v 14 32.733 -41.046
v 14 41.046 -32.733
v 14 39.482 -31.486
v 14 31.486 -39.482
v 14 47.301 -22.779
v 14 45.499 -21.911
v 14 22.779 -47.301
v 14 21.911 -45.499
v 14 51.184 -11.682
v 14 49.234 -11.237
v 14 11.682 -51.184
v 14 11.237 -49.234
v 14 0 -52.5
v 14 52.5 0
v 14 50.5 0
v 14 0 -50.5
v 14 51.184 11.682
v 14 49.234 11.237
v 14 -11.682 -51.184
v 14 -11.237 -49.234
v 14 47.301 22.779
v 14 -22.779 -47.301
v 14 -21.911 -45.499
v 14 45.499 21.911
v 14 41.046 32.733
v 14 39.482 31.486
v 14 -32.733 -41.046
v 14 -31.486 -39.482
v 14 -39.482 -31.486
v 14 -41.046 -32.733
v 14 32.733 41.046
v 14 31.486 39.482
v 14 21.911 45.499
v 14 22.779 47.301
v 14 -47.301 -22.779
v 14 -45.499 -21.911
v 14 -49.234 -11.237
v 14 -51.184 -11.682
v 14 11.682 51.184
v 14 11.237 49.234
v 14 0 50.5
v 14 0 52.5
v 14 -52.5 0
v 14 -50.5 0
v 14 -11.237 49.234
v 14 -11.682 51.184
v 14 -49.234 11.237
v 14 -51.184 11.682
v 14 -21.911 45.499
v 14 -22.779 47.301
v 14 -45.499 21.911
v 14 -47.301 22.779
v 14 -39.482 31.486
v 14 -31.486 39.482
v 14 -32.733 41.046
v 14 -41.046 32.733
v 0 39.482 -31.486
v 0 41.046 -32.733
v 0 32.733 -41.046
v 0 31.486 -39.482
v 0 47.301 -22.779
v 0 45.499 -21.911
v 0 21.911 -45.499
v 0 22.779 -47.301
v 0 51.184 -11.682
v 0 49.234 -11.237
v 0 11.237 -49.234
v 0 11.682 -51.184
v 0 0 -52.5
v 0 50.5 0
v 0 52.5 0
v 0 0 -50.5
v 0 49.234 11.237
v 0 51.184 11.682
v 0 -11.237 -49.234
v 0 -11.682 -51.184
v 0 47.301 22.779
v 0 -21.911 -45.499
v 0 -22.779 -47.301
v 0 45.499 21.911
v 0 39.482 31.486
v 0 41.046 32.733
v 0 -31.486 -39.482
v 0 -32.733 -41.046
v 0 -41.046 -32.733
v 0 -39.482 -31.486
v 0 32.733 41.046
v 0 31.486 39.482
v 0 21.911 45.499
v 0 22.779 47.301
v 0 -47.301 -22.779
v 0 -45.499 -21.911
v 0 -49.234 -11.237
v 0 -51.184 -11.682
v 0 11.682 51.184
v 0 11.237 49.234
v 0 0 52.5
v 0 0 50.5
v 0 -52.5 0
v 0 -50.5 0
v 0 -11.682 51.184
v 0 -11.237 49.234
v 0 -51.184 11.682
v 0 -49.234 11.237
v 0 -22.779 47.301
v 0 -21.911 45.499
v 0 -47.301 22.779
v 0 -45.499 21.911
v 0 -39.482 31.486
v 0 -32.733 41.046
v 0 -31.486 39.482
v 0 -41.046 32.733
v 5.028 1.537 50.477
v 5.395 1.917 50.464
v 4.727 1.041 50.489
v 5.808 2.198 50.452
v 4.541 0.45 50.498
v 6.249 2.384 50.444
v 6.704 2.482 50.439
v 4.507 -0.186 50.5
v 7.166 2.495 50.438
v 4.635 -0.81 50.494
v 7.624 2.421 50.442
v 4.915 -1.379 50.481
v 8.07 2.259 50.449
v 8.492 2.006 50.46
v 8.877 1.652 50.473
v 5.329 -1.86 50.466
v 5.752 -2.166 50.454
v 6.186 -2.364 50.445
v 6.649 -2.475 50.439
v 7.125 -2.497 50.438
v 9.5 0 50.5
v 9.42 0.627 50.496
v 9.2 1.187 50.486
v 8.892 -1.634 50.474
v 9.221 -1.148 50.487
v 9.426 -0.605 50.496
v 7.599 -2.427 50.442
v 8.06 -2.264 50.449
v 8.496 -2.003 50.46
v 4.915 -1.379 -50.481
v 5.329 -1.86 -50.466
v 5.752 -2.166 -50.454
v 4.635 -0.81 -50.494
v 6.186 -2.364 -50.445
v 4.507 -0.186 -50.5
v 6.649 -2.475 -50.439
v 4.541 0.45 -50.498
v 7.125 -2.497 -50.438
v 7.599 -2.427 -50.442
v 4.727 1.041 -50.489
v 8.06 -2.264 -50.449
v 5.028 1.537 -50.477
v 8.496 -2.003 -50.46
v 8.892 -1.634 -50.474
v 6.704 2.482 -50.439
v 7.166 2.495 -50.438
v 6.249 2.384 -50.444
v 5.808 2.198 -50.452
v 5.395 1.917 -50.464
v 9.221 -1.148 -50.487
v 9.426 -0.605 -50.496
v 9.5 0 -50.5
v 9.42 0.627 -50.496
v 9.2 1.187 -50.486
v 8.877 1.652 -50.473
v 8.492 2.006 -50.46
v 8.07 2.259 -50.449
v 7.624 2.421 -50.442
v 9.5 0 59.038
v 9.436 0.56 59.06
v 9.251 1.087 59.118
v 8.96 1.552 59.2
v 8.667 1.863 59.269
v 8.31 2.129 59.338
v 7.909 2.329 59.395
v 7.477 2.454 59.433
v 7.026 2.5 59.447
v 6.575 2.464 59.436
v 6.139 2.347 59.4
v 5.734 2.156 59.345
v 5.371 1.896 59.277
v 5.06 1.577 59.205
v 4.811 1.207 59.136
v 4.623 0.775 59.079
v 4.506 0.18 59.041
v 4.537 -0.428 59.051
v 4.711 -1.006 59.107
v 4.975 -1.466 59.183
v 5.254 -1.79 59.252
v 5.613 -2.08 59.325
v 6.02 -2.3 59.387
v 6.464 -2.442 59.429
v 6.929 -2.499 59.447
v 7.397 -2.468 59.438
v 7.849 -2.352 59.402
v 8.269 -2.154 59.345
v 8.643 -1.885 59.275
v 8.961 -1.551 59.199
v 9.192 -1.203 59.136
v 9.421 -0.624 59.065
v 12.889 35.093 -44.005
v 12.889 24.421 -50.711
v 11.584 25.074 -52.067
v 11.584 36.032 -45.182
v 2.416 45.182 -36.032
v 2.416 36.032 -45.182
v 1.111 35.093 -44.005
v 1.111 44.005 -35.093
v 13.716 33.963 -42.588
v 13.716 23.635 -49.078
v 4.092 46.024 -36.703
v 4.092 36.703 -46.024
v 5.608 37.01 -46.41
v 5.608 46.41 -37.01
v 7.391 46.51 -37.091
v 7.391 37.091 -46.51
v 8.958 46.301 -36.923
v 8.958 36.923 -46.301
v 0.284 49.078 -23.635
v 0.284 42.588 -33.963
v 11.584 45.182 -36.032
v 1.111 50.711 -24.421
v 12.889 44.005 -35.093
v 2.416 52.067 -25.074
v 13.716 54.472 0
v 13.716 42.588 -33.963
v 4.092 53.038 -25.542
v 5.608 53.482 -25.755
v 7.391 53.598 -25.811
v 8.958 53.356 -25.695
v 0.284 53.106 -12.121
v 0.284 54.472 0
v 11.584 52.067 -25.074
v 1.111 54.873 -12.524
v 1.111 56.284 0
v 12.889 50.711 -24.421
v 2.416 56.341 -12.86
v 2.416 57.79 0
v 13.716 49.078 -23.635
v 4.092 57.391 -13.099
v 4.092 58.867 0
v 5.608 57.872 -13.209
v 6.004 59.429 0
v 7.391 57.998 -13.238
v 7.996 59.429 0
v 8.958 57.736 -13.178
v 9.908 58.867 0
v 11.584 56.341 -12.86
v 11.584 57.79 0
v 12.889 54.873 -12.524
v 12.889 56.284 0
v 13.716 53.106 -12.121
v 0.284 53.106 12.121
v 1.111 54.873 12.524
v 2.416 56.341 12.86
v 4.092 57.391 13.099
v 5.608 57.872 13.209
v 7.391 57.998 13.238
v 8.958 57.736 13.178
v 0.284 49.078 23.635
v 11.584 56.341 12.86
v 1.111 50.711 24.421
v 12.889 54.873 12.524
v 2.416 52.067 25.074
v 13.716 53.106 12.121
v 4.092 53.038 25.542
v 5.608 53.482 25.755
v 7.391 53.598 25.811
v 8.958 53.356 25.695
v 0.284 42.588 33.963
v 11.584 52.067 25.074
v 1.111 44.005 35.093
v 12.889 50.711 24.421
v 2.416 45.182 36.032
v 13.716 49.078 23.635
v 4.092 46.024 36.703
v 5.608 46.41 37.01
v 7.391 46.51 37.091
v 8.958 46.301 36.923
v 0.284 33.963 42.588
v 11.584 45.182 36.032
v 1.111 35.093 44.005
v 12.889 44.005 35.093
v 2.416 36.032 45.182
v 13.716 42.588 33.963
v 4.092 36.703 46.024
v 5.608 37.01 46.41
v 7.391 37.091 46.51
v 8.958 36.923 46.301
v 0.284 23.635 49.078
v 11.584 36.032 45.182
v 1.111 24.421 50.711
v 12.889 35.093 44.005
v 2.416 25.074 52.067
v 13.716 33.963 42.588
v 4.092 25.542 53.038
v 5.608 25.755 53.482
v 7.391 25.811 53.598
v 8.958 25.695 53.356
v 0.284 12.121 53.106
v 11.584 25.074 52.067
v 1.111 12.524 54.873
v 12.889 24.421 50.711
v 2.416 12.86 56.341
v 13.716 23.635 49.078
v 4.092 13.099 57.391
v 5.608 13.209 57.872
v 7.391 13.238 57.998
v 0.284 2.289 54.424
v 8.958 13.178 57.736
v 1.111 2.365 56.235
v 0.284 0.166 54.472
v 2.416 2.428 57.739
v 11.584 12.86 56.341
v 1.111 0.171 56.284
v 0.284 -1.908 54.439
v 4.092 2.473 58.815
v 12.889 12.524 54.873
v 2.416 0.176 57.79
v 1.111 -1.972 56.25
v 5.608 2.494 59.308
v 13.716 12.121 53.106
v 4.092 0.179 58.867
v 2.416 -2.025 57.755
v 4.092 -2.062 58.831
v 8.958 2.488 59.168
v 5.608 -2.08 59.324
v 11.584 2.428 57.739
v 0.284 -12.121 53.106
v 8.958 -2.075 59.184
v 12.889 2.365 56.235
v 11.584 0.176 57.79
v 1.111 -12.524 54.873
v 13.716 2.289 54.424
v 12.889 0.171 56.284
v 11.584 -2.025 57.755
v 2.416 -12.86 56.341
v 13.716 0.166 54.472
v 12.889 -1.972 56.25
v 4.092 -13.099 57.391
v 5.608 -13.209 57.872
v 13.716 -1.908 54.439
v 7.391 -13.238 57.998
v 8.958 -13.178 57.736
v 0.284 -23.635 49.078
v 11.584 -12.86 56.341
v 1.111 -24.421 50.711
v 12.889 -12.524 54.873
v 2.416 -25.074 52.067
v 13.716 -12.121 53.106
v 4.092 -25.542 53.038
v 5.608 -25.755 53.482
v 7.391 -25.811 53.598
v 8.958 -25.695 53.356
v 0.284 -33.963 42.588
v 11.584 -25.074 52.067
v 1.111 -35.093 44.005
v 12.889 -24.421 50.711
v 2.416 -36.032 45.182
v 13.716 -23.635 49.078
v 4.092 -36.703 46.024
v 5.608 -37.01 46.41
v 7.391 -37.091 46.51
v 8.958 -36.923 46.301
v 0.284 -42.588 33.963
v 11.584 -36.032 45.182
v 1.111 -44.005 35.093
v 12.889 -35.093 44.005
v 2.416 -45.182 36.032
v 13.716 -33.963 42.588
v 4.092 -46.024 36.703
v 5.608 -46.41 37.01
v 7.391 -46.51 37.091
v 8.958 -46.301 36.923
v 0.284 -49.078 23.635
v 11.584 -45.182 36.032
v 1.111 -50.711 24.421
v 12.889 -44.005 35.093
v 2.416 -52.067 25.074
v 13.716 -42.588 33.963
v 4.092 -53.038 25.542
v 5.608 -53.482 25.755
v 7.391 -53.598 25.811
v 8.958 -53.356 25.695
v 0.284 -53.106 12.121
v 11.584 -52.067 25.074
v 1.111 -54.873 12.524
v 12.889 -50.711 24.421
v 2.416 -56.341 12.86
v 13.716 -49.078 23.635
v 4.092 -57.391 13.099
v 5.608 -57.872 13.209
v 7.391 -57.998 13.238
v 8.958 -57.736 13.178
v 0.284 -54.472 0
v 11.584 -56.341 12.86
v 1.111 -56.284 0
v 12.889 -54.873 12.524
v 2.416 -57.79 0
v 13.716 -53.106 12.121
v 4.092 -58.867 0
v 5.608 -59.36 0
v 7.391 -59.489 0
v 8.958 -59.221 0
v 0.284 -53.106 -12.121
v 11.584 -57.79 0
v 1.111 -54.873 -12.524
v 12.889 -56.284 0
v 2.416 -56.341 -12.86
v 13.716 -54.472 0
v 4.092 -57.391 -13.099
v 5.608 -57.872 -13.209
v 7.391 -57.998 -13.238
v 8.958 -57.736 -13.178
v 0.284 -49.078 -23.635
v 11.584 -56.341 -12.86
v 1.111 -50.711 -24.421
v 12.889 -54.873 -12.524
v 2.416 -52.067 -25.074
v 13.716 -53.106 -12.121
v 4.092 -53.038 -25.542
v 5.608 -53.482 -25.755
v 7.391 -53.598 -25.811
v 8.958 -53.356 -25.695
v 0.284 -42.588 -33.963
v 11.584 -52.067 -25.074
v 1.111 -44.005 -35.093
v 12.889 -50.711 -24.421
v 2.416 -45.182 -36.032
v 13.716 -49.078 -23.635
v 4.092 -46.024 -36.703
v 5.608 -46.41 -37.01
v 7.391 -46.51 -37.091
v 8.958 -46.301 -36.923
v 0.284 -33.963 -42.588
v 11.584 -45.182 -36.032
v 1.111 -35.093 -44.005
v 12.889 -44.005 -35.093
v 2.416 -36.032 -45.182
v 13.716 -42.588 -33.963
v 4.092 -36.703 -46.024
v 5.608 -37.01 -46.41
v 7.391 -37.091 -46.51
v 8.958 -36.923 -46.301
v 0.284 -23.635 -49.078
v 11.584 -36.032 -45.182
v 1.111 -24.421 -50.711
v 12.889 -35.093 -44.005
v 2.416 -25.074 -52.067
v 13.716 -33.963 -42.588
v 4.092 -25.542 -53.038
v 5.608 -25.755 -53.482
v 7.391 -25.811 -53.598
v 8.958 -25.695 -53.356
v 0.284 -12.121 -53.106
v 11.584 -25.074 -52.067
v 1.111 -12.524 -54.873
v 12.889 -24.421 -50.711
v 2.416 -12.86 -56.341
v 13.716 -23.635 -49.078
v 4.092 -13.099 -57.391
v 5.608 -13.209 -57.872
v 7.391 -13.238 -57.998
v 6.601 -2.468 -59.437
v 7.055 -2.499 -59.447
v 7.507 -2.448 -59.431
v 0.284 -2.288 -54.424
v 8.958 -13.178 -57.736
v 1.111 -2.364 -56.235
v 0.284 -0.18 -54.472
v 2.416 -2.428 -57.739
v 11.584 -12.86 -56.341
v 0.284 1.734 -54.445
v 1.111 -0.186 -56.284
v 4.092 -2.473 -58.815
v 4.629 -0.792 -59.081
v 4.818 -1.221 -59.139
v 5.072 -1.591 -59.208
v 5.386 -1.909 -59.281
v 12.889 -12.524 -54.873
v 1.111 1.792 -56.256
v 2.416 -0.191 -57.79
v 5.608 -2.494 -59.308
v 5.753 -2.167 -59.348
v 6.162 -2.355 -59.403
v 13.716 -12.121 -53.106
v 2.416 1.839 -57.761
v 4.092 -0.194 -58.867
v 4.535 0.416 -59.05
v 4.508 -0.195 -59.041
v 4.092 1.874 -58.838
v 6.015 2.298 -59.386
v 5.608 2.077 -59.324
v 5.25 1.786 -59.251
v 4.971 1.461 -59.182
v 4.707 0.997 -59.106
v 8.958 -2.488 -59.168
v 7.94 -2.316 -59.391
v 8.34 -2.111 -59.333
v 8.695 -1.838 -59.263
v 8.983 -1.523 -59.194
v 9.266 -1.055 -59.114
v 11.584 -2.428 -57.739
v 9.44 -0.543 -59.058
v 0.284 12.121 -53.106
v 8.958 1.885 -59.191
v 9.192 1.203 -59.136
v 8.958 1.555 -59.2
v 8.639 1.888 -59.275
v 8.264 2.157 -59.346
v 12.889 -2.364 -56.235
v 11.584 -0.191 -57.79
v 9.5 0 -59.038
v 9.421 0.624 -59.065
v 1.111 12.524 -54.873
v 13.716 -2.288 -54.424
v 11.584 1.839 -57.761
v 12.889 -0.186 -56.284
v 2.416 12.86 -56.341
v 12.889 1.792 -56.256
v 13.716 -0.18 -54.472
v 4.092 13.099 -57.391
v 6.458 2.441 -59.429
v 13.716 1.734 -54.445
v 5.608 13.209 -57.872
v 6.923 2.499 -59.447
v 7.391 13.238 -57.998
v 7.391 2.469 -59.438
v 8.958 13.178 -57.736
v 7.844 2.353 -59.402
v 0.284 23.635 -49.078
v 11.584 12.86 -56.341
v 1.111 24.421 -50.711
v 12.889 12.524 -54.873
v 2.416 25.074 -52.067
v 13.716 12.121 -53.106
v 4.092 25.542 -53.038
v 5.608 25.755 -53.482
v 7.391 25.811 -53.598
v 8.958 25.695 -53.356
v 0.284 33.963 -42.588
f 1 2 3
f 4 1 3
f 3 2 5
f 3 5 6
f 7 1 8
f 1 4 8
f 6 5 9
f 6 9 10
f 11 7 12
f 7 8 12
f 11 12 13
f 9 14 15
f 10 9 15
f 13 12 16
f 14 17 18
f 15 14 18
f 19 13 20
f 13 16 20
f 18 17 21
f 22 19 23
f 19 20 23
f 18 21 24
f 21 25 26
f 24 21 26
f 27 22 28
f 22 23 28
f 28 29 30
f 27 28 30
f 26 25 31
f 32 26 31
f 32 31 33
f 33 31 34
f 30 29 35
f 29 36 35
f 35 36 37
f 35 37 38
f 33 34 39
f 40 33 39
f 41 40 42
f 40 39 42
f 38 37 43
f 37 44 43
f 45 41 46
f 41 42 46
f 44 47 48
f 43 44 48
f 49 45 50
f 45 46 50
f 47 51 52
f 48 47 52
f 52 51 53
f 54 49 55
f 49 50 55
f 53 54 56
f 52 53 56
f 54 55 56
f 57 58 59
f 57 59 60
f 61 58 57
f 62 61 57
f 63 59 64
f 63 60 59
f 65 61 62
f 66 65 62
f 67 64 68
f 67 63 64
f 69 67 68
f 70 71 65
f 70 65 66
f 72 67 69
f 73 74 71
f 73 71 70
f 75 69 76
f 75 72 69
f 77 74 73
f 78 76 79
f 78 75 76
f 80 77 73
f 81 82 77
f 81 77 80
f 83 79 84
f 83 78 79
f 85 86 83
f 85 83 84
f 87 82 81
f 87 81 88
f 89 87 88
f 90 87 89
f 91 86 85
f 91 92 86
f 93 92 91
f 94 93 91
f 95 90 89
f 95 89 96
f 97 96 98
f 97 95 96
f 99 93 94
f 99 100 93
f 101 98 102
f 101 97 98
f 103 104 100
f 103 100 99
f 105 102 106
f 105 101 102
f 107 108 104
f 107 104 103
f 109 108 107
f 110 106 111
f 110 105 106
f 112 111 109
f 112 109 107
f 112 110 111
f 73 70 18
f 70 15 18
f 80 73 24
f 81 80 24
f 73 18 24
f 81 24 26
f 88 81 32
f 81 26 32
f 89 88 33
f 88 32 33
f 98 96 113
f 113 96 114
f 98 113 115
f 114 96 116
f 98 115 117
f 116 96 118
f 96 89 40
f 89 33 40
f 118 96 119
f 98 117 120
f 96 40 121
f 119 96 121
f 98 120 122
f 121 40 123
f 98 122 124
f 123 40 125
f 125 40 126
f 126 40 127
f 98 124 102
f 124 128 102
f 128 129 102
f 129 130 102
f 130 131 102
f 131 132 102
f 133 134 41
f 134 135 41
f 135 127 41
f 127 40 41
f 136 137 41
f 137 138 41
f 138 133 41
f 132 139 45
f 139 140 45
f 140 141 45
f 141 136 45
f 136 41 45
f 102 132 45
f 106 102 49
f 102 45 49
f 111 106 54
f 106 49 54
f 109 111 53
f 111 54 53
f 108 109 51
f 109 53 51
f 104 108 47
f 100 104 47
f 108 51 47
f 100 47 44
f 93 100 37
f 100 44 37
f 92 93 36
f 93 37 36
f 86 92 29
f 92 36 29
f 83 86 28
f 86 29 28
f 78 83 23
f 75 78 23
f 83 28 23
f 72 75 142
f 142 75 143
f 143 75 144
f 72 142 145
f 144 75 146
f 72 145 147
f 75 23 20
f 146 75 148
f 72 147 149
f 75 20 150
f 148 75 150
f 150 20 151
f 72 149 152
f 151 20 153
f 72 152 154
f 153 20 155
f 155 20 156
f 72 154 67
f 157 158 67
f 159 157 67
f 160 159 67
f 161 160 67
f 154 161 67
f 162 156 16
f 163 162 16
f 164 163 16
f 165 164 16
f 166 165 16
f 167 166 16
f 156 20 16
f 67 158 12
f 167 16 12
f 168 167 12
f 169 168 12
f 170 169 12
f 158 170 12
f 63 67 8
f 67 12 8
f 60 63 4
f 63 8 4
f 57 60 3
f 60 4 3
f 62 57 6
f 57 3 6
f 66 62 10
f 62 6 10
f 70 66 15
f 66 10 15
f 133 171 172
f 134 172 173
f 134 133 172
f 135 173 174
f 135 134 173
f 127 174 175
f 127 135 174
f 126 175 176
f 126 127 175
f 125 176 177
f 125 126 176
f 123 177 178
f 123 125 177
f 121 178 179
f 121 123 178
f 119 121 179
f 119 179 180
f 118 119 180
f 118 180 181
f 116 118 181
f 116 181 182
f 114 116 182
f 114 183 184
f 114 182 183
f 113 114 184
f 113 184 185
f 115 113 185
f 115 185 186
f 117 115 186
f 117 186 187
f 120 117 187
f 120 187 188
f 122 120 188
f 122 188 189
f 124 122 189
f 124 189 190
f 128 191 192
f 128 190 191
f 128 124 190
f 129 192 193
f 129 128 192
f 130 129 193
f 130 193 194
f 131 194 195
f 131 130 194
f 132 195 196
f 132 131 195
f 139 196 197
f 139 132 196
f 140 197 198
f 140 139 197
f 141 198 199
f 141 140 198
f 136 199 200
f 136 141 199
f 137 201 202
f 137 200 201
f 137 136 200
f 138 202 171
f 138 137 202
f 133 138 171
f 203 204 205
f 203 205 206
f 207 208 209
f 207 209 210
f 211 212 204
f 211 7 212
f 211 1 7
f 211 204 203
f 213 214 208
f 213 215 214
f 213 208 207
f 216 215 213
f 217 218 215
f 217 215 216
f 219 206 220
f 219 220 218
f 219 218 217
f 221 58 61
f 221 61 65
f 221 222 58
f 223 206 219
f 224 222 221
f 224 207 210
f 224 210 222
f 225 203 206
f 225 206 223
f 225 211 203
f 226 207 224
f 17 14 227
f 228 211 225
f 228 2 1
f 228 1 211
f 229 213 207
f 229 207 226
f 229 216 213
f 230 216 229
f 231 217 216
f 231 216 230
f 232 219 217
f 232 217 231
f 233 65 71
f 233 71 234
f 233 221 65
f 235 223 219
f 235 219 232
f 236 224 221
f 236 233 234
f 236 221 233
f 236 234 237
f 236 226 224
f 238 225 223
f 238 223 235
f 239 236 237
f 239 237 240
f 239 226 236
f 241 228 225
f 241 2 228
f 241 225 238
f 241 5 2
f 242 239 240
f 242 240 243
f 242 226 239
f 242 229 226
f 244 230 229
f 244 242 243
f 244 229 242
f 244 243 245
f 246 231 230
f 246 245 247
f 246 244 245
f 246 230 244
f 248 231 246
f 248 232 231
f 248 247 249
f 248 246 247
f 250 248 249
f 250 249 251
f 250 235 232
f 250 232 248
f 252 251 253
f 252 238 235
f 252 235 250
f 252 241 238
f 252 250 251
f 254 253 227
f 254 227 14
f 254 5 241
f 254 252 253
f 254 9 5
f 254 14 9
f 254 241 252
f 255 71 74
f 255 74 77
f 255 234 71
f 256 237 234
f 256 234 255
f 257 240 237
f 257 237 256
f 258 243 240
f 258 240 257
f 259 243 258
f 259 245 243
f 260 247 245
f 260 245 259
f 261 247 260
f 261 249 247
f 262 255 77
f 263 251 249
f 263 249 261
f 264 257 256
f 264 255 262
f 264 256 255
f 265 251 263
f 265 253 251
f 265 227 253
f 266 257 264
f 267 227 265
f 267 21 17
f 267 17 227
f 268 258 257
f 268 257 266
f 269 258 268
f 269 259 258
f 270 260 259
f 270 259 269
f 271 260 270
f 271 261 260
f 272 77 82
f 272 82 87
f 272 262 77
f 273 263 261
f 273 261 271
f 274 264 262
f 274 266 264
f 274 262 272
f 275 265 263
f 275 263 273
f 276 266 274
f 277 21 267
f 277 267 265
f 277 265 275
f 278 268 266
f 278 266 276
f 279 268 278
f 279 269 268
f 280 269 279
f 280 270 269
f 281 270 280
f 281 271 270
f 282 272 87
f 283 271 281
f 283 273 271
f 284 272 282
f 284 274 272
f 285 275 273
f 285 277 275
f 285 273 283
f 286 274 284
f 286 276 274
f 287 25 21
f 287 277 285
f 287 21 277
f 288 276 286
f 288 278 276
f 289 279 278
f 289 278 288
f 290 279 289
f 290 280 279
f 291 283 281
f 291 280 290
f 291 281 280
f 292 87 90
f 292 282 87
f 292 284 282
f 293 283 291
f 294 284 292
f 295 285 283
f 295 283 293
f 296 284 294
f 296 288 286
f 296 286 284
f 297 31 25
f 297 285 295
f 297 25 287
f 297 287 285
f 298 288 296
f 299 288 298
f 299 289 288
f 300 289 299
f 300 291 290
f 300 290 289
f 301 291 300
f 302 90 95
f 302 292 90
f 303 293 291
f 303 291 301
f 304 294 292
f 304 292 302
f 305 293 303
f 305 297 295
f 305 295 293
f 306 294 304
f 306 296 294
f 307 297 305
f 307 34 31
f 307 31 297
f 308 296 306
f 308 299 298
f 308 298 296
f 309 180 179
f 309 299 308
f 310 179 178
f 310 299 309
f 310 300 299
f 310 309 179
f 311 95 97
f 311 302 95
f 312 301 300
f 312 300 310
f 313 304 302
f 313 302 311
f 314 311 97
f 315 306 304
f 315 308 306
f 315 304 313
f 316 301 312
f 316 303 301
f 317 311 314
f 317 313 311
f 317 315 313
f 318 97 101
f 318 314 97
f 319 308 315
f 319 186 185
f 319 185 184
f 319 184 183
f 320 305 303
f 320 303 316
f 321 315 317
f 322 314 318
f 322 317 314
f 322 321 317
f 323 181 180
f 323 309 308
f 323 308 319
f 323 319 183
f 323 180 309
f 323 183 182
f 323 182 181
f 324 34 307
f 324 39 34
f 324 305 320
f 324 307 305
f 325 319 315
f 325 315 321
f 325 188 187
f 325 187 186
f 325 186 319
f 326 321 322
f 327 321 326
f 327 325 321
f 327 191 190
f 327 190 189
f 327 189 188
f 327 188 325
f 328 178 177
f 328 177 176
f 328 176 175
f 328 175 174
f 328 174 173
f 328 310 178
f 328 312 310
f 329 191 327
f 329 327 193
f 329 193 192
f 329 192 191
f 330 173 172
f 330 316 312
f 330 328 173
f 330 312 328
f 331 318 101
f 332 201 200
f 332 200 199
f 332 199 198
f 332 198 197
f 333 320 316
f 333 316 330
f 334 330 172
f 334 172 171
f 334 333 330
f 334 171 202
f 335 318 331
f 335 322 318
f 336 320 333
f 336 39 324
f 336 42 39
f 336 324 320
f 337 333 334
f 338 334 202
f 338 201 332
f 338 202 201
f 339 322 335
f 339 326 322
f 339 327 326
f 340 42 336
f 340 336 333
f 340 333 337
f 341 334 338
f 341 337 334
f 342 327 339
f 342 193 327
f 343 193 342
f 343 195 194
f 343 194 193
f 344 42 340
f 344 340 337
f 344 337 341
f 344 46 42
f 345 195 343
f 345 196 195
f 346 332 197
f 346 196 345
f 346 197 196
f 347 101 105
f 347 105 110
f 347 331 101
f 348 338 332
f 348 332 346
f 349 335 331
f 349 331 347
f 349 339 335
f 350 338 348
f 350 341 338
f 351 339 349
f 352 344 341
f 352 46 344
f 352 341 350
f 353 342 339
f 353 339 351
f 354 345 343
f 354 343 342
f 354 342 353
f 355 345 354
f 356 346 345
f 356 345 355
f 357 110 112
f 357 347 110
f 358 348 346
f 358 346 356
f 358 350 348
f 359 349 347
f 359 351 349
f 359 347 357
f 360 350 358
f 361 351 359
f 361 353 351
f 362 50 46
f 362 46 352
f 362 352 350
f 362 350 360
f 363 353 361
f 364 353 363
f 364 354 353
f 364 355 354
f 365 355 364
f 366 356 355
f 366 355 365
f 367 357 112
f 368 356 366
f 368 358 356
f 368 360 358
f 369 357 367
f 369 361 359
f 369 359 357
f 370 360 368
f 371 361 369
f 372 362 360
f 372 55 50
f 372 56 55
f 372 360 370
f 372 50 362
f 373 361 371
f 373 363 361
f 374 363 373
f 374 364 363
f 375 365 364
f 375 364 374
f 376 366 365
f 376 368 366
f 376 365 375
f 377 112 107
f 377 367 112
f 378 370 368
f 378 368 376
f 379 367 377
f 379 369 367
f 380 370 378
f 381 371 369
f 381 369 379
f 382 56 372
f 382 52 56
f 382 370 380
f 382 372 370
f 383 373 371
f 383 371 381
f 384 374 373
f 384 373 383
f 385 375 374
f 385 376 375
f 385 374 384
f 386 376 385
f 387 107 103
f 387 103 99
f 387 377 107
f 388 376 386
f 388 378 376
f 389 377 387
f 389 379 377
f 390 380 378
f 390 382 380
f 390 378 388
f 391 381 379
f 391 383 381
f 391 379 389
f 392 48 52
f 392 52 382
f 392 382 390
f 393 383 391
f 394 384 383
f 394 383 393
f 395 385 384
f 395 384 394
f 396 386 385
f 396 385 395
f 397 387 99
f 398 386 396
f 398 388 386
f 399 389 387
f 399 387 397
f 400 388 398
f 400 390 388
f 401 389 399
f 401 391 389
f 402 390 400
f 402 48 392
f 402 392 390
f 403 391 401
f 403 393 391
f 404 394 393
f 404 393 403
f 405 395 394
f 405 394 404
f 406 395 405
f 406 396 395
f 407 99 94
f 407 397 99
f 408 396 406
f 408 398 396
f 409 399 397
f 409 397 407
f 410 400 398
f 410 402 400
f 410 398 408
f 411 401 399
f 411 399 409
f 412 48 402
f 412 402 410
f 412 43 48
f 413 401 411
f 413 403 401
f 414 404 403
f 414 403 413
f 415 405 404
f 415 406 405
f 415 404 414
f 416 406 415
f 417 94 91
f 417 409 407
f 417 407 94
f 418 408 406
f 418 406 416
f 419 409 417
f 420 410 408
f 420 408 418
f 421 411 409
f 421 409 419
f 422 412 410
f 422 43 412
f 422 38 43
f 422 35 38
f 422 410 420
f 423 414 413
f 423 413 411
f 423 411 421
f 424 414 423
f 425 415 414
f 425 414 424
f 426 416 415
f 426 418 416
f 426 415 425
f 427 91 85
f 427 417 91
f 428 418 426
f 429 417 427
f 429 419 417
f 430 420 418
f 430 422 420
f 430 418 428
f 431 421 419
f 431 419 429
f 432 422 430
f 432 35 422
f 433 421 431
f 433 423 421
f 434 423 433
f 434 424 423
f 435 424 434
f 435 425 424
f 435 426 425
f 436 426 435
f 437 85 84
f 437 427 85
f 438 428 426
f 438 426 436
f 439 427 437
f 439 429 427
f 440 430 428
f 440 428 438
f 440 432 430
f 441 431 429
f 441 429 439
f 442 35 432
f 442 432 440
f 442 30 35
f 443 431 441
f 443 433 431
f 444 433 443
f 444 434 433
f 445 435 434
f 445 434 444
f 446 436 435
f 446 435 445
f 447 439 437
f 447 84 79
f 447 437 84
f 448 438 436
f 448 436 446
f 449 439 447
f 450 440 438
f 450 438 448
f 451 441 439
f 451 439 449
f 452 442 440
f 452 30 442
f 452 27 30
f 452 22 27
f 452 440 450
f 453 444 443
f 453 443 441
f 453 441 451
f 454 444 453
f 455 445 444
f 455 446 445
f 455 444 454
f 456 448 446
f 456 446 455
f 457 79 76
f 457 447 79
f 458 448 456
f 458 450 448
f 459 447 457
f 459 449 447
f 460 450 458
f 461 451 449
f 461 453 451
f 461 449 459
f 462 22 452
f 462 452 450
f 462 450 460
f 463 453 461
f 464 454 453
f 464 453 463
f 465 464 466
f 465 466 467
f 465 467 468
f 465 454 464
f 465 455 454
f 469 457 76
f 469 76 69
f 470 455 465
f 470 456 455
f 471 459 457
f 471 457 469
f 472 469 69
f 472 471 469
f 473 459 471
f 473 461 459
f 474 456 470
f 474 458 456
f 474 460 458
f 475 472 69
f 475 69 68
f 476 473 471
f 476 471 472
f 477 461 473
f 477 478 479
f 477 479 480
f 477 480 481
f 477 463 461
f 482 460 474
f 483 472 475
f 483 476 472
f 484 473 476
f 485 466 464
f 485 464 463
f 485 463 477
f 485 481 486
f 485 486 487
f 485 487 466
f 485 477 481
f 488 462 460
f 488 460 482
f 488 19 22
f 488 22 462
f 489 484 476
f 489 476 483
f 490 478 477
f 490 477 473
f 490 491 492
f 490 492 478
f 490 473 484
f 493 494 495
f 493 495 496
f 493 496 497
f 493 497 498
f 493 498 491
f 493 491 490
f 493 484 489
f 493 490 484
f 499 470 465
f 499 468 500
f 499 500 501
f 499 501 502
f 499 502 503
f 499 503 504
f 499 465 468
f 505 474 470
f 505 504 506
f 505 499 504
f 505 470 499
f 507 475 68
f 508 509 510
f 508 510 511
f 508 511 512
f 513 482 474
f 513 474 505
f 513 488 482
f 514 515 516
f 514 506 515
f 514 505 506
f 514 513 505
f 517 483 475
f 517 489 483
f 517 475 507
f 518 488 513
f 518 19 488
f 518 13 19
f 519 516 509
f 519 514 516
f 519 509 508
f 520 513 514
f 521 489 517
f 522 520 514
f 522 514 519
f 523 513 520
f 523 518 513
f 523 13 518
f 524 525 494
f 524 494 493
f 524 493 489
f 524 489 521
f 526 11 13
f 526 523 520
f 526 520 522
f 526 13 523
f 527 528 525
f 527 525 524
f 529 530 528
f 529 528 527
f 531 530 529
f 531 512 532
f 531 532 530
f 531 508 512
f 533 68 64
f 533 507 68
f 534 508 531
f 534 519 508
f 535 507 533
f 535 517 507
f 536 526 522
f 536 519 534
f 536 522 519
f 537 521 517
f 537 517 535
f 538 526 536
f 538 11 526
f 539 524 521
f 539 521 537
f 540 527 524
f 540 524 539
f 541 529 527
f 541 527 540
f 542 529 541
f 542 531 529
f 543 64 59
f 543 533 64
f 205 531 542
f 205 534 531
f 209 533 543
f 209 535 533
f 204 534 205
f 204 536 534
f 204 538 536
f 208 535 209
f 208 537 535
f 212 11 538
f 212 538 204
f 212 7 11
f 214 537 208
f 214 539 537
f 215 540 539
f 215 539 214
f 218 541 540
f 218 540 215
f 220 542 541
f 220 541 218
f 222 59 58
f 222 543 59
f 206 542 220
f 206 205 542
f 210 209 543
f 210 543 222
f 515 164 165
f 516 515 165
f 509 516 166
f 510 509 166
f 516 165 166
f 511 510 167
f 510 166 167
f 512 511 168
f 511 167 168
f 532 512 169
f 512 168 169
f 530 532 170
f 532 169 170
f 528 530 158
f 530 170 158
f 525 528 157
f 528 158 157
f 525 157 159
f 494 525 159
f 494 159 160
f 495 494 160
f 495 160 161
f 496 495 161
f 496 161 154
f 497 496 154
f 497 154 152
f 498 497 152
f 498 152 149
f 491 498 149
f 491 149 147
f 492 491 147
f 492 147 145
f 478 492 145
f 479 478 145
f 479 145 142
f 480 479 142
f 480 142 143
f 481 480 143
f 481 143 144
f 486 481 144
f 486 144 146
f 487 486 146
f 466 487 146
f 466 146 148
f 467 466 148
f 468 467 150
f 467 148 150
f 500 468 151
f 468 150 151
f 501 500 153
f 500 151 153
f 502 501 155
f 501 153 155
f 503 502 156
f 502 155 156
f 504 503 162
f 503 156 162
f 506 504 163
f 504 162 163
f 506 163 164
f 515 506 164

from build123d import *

# Parameters (mm, degrees)
SKETCH1_W                      = 14
SKETCH1_H                      = 2
CUT_EXTRUDE1_REACH             = 61.5
SKETCH1_3_R                    = 2.5
CUT_EXTRUDE1_DIRECTION_2_REACH = 61.5


with BuildPart() as part:
    # Sketch1 → Revolve1 (revolve)
    with BuildSketch(Plane.XY):
        with Locations((7, 51.5)):
            Rectangle(SKETCH1_W, SKETCH1_H)
        with BuildLine():
            ThreePointArc((0, 52.5), (7, 59.5), (14, 52.5))
            Line((14, 52.5), (0, 52.5))
        make_face()
    revolve(axis=Axis((0, 0, 0), (1, 0, 0)))

    # Sketch1<3> → Cut-Extrude1 (cut, up to next)
    with BuildSketch(Plane.XY, mode=Mode.PRIVATE) as cut_extrude1_sk1:
        with Locations((7, 0)):
            Circle(SKETCH1_3_R)
    cut_extrude1_tool1 = extrude(cut_extrude1_sk1.sketch, amount=-CUT_EXTRUDE1_REACH, mode=Mode.PRIVATE) & part.part
    add(cut_extrude1_tool1.solids().sort_by_distance((7, 0, 0))[0], mode=Mode.SUBTRACT)

    # Sketch1<3> → Cut-Extrude1 direction 2 (cut, up to next)
    with BuildSketch(Plane.XY, mode=Mode.PRIVATE) as cut_extrude1_direction_2_sk1:
        with Locations((7, 0)):
            Circle(SKETCH1_3_R)
    cut_extrude1_direction_2_tool1 = extrude(cut_extrude1_direction_2_sk1.sketch, amount=CUT_EXTRUDE1_DIRECTION_2_REACH, mode=Mode.PRIVATE) & part.part
    add(cut_extrude1_direction_2_tool1.solids().sort_by_distance((7, 0, 0))[0], mode=Mode.SUBTRACT)


solid = part.part
